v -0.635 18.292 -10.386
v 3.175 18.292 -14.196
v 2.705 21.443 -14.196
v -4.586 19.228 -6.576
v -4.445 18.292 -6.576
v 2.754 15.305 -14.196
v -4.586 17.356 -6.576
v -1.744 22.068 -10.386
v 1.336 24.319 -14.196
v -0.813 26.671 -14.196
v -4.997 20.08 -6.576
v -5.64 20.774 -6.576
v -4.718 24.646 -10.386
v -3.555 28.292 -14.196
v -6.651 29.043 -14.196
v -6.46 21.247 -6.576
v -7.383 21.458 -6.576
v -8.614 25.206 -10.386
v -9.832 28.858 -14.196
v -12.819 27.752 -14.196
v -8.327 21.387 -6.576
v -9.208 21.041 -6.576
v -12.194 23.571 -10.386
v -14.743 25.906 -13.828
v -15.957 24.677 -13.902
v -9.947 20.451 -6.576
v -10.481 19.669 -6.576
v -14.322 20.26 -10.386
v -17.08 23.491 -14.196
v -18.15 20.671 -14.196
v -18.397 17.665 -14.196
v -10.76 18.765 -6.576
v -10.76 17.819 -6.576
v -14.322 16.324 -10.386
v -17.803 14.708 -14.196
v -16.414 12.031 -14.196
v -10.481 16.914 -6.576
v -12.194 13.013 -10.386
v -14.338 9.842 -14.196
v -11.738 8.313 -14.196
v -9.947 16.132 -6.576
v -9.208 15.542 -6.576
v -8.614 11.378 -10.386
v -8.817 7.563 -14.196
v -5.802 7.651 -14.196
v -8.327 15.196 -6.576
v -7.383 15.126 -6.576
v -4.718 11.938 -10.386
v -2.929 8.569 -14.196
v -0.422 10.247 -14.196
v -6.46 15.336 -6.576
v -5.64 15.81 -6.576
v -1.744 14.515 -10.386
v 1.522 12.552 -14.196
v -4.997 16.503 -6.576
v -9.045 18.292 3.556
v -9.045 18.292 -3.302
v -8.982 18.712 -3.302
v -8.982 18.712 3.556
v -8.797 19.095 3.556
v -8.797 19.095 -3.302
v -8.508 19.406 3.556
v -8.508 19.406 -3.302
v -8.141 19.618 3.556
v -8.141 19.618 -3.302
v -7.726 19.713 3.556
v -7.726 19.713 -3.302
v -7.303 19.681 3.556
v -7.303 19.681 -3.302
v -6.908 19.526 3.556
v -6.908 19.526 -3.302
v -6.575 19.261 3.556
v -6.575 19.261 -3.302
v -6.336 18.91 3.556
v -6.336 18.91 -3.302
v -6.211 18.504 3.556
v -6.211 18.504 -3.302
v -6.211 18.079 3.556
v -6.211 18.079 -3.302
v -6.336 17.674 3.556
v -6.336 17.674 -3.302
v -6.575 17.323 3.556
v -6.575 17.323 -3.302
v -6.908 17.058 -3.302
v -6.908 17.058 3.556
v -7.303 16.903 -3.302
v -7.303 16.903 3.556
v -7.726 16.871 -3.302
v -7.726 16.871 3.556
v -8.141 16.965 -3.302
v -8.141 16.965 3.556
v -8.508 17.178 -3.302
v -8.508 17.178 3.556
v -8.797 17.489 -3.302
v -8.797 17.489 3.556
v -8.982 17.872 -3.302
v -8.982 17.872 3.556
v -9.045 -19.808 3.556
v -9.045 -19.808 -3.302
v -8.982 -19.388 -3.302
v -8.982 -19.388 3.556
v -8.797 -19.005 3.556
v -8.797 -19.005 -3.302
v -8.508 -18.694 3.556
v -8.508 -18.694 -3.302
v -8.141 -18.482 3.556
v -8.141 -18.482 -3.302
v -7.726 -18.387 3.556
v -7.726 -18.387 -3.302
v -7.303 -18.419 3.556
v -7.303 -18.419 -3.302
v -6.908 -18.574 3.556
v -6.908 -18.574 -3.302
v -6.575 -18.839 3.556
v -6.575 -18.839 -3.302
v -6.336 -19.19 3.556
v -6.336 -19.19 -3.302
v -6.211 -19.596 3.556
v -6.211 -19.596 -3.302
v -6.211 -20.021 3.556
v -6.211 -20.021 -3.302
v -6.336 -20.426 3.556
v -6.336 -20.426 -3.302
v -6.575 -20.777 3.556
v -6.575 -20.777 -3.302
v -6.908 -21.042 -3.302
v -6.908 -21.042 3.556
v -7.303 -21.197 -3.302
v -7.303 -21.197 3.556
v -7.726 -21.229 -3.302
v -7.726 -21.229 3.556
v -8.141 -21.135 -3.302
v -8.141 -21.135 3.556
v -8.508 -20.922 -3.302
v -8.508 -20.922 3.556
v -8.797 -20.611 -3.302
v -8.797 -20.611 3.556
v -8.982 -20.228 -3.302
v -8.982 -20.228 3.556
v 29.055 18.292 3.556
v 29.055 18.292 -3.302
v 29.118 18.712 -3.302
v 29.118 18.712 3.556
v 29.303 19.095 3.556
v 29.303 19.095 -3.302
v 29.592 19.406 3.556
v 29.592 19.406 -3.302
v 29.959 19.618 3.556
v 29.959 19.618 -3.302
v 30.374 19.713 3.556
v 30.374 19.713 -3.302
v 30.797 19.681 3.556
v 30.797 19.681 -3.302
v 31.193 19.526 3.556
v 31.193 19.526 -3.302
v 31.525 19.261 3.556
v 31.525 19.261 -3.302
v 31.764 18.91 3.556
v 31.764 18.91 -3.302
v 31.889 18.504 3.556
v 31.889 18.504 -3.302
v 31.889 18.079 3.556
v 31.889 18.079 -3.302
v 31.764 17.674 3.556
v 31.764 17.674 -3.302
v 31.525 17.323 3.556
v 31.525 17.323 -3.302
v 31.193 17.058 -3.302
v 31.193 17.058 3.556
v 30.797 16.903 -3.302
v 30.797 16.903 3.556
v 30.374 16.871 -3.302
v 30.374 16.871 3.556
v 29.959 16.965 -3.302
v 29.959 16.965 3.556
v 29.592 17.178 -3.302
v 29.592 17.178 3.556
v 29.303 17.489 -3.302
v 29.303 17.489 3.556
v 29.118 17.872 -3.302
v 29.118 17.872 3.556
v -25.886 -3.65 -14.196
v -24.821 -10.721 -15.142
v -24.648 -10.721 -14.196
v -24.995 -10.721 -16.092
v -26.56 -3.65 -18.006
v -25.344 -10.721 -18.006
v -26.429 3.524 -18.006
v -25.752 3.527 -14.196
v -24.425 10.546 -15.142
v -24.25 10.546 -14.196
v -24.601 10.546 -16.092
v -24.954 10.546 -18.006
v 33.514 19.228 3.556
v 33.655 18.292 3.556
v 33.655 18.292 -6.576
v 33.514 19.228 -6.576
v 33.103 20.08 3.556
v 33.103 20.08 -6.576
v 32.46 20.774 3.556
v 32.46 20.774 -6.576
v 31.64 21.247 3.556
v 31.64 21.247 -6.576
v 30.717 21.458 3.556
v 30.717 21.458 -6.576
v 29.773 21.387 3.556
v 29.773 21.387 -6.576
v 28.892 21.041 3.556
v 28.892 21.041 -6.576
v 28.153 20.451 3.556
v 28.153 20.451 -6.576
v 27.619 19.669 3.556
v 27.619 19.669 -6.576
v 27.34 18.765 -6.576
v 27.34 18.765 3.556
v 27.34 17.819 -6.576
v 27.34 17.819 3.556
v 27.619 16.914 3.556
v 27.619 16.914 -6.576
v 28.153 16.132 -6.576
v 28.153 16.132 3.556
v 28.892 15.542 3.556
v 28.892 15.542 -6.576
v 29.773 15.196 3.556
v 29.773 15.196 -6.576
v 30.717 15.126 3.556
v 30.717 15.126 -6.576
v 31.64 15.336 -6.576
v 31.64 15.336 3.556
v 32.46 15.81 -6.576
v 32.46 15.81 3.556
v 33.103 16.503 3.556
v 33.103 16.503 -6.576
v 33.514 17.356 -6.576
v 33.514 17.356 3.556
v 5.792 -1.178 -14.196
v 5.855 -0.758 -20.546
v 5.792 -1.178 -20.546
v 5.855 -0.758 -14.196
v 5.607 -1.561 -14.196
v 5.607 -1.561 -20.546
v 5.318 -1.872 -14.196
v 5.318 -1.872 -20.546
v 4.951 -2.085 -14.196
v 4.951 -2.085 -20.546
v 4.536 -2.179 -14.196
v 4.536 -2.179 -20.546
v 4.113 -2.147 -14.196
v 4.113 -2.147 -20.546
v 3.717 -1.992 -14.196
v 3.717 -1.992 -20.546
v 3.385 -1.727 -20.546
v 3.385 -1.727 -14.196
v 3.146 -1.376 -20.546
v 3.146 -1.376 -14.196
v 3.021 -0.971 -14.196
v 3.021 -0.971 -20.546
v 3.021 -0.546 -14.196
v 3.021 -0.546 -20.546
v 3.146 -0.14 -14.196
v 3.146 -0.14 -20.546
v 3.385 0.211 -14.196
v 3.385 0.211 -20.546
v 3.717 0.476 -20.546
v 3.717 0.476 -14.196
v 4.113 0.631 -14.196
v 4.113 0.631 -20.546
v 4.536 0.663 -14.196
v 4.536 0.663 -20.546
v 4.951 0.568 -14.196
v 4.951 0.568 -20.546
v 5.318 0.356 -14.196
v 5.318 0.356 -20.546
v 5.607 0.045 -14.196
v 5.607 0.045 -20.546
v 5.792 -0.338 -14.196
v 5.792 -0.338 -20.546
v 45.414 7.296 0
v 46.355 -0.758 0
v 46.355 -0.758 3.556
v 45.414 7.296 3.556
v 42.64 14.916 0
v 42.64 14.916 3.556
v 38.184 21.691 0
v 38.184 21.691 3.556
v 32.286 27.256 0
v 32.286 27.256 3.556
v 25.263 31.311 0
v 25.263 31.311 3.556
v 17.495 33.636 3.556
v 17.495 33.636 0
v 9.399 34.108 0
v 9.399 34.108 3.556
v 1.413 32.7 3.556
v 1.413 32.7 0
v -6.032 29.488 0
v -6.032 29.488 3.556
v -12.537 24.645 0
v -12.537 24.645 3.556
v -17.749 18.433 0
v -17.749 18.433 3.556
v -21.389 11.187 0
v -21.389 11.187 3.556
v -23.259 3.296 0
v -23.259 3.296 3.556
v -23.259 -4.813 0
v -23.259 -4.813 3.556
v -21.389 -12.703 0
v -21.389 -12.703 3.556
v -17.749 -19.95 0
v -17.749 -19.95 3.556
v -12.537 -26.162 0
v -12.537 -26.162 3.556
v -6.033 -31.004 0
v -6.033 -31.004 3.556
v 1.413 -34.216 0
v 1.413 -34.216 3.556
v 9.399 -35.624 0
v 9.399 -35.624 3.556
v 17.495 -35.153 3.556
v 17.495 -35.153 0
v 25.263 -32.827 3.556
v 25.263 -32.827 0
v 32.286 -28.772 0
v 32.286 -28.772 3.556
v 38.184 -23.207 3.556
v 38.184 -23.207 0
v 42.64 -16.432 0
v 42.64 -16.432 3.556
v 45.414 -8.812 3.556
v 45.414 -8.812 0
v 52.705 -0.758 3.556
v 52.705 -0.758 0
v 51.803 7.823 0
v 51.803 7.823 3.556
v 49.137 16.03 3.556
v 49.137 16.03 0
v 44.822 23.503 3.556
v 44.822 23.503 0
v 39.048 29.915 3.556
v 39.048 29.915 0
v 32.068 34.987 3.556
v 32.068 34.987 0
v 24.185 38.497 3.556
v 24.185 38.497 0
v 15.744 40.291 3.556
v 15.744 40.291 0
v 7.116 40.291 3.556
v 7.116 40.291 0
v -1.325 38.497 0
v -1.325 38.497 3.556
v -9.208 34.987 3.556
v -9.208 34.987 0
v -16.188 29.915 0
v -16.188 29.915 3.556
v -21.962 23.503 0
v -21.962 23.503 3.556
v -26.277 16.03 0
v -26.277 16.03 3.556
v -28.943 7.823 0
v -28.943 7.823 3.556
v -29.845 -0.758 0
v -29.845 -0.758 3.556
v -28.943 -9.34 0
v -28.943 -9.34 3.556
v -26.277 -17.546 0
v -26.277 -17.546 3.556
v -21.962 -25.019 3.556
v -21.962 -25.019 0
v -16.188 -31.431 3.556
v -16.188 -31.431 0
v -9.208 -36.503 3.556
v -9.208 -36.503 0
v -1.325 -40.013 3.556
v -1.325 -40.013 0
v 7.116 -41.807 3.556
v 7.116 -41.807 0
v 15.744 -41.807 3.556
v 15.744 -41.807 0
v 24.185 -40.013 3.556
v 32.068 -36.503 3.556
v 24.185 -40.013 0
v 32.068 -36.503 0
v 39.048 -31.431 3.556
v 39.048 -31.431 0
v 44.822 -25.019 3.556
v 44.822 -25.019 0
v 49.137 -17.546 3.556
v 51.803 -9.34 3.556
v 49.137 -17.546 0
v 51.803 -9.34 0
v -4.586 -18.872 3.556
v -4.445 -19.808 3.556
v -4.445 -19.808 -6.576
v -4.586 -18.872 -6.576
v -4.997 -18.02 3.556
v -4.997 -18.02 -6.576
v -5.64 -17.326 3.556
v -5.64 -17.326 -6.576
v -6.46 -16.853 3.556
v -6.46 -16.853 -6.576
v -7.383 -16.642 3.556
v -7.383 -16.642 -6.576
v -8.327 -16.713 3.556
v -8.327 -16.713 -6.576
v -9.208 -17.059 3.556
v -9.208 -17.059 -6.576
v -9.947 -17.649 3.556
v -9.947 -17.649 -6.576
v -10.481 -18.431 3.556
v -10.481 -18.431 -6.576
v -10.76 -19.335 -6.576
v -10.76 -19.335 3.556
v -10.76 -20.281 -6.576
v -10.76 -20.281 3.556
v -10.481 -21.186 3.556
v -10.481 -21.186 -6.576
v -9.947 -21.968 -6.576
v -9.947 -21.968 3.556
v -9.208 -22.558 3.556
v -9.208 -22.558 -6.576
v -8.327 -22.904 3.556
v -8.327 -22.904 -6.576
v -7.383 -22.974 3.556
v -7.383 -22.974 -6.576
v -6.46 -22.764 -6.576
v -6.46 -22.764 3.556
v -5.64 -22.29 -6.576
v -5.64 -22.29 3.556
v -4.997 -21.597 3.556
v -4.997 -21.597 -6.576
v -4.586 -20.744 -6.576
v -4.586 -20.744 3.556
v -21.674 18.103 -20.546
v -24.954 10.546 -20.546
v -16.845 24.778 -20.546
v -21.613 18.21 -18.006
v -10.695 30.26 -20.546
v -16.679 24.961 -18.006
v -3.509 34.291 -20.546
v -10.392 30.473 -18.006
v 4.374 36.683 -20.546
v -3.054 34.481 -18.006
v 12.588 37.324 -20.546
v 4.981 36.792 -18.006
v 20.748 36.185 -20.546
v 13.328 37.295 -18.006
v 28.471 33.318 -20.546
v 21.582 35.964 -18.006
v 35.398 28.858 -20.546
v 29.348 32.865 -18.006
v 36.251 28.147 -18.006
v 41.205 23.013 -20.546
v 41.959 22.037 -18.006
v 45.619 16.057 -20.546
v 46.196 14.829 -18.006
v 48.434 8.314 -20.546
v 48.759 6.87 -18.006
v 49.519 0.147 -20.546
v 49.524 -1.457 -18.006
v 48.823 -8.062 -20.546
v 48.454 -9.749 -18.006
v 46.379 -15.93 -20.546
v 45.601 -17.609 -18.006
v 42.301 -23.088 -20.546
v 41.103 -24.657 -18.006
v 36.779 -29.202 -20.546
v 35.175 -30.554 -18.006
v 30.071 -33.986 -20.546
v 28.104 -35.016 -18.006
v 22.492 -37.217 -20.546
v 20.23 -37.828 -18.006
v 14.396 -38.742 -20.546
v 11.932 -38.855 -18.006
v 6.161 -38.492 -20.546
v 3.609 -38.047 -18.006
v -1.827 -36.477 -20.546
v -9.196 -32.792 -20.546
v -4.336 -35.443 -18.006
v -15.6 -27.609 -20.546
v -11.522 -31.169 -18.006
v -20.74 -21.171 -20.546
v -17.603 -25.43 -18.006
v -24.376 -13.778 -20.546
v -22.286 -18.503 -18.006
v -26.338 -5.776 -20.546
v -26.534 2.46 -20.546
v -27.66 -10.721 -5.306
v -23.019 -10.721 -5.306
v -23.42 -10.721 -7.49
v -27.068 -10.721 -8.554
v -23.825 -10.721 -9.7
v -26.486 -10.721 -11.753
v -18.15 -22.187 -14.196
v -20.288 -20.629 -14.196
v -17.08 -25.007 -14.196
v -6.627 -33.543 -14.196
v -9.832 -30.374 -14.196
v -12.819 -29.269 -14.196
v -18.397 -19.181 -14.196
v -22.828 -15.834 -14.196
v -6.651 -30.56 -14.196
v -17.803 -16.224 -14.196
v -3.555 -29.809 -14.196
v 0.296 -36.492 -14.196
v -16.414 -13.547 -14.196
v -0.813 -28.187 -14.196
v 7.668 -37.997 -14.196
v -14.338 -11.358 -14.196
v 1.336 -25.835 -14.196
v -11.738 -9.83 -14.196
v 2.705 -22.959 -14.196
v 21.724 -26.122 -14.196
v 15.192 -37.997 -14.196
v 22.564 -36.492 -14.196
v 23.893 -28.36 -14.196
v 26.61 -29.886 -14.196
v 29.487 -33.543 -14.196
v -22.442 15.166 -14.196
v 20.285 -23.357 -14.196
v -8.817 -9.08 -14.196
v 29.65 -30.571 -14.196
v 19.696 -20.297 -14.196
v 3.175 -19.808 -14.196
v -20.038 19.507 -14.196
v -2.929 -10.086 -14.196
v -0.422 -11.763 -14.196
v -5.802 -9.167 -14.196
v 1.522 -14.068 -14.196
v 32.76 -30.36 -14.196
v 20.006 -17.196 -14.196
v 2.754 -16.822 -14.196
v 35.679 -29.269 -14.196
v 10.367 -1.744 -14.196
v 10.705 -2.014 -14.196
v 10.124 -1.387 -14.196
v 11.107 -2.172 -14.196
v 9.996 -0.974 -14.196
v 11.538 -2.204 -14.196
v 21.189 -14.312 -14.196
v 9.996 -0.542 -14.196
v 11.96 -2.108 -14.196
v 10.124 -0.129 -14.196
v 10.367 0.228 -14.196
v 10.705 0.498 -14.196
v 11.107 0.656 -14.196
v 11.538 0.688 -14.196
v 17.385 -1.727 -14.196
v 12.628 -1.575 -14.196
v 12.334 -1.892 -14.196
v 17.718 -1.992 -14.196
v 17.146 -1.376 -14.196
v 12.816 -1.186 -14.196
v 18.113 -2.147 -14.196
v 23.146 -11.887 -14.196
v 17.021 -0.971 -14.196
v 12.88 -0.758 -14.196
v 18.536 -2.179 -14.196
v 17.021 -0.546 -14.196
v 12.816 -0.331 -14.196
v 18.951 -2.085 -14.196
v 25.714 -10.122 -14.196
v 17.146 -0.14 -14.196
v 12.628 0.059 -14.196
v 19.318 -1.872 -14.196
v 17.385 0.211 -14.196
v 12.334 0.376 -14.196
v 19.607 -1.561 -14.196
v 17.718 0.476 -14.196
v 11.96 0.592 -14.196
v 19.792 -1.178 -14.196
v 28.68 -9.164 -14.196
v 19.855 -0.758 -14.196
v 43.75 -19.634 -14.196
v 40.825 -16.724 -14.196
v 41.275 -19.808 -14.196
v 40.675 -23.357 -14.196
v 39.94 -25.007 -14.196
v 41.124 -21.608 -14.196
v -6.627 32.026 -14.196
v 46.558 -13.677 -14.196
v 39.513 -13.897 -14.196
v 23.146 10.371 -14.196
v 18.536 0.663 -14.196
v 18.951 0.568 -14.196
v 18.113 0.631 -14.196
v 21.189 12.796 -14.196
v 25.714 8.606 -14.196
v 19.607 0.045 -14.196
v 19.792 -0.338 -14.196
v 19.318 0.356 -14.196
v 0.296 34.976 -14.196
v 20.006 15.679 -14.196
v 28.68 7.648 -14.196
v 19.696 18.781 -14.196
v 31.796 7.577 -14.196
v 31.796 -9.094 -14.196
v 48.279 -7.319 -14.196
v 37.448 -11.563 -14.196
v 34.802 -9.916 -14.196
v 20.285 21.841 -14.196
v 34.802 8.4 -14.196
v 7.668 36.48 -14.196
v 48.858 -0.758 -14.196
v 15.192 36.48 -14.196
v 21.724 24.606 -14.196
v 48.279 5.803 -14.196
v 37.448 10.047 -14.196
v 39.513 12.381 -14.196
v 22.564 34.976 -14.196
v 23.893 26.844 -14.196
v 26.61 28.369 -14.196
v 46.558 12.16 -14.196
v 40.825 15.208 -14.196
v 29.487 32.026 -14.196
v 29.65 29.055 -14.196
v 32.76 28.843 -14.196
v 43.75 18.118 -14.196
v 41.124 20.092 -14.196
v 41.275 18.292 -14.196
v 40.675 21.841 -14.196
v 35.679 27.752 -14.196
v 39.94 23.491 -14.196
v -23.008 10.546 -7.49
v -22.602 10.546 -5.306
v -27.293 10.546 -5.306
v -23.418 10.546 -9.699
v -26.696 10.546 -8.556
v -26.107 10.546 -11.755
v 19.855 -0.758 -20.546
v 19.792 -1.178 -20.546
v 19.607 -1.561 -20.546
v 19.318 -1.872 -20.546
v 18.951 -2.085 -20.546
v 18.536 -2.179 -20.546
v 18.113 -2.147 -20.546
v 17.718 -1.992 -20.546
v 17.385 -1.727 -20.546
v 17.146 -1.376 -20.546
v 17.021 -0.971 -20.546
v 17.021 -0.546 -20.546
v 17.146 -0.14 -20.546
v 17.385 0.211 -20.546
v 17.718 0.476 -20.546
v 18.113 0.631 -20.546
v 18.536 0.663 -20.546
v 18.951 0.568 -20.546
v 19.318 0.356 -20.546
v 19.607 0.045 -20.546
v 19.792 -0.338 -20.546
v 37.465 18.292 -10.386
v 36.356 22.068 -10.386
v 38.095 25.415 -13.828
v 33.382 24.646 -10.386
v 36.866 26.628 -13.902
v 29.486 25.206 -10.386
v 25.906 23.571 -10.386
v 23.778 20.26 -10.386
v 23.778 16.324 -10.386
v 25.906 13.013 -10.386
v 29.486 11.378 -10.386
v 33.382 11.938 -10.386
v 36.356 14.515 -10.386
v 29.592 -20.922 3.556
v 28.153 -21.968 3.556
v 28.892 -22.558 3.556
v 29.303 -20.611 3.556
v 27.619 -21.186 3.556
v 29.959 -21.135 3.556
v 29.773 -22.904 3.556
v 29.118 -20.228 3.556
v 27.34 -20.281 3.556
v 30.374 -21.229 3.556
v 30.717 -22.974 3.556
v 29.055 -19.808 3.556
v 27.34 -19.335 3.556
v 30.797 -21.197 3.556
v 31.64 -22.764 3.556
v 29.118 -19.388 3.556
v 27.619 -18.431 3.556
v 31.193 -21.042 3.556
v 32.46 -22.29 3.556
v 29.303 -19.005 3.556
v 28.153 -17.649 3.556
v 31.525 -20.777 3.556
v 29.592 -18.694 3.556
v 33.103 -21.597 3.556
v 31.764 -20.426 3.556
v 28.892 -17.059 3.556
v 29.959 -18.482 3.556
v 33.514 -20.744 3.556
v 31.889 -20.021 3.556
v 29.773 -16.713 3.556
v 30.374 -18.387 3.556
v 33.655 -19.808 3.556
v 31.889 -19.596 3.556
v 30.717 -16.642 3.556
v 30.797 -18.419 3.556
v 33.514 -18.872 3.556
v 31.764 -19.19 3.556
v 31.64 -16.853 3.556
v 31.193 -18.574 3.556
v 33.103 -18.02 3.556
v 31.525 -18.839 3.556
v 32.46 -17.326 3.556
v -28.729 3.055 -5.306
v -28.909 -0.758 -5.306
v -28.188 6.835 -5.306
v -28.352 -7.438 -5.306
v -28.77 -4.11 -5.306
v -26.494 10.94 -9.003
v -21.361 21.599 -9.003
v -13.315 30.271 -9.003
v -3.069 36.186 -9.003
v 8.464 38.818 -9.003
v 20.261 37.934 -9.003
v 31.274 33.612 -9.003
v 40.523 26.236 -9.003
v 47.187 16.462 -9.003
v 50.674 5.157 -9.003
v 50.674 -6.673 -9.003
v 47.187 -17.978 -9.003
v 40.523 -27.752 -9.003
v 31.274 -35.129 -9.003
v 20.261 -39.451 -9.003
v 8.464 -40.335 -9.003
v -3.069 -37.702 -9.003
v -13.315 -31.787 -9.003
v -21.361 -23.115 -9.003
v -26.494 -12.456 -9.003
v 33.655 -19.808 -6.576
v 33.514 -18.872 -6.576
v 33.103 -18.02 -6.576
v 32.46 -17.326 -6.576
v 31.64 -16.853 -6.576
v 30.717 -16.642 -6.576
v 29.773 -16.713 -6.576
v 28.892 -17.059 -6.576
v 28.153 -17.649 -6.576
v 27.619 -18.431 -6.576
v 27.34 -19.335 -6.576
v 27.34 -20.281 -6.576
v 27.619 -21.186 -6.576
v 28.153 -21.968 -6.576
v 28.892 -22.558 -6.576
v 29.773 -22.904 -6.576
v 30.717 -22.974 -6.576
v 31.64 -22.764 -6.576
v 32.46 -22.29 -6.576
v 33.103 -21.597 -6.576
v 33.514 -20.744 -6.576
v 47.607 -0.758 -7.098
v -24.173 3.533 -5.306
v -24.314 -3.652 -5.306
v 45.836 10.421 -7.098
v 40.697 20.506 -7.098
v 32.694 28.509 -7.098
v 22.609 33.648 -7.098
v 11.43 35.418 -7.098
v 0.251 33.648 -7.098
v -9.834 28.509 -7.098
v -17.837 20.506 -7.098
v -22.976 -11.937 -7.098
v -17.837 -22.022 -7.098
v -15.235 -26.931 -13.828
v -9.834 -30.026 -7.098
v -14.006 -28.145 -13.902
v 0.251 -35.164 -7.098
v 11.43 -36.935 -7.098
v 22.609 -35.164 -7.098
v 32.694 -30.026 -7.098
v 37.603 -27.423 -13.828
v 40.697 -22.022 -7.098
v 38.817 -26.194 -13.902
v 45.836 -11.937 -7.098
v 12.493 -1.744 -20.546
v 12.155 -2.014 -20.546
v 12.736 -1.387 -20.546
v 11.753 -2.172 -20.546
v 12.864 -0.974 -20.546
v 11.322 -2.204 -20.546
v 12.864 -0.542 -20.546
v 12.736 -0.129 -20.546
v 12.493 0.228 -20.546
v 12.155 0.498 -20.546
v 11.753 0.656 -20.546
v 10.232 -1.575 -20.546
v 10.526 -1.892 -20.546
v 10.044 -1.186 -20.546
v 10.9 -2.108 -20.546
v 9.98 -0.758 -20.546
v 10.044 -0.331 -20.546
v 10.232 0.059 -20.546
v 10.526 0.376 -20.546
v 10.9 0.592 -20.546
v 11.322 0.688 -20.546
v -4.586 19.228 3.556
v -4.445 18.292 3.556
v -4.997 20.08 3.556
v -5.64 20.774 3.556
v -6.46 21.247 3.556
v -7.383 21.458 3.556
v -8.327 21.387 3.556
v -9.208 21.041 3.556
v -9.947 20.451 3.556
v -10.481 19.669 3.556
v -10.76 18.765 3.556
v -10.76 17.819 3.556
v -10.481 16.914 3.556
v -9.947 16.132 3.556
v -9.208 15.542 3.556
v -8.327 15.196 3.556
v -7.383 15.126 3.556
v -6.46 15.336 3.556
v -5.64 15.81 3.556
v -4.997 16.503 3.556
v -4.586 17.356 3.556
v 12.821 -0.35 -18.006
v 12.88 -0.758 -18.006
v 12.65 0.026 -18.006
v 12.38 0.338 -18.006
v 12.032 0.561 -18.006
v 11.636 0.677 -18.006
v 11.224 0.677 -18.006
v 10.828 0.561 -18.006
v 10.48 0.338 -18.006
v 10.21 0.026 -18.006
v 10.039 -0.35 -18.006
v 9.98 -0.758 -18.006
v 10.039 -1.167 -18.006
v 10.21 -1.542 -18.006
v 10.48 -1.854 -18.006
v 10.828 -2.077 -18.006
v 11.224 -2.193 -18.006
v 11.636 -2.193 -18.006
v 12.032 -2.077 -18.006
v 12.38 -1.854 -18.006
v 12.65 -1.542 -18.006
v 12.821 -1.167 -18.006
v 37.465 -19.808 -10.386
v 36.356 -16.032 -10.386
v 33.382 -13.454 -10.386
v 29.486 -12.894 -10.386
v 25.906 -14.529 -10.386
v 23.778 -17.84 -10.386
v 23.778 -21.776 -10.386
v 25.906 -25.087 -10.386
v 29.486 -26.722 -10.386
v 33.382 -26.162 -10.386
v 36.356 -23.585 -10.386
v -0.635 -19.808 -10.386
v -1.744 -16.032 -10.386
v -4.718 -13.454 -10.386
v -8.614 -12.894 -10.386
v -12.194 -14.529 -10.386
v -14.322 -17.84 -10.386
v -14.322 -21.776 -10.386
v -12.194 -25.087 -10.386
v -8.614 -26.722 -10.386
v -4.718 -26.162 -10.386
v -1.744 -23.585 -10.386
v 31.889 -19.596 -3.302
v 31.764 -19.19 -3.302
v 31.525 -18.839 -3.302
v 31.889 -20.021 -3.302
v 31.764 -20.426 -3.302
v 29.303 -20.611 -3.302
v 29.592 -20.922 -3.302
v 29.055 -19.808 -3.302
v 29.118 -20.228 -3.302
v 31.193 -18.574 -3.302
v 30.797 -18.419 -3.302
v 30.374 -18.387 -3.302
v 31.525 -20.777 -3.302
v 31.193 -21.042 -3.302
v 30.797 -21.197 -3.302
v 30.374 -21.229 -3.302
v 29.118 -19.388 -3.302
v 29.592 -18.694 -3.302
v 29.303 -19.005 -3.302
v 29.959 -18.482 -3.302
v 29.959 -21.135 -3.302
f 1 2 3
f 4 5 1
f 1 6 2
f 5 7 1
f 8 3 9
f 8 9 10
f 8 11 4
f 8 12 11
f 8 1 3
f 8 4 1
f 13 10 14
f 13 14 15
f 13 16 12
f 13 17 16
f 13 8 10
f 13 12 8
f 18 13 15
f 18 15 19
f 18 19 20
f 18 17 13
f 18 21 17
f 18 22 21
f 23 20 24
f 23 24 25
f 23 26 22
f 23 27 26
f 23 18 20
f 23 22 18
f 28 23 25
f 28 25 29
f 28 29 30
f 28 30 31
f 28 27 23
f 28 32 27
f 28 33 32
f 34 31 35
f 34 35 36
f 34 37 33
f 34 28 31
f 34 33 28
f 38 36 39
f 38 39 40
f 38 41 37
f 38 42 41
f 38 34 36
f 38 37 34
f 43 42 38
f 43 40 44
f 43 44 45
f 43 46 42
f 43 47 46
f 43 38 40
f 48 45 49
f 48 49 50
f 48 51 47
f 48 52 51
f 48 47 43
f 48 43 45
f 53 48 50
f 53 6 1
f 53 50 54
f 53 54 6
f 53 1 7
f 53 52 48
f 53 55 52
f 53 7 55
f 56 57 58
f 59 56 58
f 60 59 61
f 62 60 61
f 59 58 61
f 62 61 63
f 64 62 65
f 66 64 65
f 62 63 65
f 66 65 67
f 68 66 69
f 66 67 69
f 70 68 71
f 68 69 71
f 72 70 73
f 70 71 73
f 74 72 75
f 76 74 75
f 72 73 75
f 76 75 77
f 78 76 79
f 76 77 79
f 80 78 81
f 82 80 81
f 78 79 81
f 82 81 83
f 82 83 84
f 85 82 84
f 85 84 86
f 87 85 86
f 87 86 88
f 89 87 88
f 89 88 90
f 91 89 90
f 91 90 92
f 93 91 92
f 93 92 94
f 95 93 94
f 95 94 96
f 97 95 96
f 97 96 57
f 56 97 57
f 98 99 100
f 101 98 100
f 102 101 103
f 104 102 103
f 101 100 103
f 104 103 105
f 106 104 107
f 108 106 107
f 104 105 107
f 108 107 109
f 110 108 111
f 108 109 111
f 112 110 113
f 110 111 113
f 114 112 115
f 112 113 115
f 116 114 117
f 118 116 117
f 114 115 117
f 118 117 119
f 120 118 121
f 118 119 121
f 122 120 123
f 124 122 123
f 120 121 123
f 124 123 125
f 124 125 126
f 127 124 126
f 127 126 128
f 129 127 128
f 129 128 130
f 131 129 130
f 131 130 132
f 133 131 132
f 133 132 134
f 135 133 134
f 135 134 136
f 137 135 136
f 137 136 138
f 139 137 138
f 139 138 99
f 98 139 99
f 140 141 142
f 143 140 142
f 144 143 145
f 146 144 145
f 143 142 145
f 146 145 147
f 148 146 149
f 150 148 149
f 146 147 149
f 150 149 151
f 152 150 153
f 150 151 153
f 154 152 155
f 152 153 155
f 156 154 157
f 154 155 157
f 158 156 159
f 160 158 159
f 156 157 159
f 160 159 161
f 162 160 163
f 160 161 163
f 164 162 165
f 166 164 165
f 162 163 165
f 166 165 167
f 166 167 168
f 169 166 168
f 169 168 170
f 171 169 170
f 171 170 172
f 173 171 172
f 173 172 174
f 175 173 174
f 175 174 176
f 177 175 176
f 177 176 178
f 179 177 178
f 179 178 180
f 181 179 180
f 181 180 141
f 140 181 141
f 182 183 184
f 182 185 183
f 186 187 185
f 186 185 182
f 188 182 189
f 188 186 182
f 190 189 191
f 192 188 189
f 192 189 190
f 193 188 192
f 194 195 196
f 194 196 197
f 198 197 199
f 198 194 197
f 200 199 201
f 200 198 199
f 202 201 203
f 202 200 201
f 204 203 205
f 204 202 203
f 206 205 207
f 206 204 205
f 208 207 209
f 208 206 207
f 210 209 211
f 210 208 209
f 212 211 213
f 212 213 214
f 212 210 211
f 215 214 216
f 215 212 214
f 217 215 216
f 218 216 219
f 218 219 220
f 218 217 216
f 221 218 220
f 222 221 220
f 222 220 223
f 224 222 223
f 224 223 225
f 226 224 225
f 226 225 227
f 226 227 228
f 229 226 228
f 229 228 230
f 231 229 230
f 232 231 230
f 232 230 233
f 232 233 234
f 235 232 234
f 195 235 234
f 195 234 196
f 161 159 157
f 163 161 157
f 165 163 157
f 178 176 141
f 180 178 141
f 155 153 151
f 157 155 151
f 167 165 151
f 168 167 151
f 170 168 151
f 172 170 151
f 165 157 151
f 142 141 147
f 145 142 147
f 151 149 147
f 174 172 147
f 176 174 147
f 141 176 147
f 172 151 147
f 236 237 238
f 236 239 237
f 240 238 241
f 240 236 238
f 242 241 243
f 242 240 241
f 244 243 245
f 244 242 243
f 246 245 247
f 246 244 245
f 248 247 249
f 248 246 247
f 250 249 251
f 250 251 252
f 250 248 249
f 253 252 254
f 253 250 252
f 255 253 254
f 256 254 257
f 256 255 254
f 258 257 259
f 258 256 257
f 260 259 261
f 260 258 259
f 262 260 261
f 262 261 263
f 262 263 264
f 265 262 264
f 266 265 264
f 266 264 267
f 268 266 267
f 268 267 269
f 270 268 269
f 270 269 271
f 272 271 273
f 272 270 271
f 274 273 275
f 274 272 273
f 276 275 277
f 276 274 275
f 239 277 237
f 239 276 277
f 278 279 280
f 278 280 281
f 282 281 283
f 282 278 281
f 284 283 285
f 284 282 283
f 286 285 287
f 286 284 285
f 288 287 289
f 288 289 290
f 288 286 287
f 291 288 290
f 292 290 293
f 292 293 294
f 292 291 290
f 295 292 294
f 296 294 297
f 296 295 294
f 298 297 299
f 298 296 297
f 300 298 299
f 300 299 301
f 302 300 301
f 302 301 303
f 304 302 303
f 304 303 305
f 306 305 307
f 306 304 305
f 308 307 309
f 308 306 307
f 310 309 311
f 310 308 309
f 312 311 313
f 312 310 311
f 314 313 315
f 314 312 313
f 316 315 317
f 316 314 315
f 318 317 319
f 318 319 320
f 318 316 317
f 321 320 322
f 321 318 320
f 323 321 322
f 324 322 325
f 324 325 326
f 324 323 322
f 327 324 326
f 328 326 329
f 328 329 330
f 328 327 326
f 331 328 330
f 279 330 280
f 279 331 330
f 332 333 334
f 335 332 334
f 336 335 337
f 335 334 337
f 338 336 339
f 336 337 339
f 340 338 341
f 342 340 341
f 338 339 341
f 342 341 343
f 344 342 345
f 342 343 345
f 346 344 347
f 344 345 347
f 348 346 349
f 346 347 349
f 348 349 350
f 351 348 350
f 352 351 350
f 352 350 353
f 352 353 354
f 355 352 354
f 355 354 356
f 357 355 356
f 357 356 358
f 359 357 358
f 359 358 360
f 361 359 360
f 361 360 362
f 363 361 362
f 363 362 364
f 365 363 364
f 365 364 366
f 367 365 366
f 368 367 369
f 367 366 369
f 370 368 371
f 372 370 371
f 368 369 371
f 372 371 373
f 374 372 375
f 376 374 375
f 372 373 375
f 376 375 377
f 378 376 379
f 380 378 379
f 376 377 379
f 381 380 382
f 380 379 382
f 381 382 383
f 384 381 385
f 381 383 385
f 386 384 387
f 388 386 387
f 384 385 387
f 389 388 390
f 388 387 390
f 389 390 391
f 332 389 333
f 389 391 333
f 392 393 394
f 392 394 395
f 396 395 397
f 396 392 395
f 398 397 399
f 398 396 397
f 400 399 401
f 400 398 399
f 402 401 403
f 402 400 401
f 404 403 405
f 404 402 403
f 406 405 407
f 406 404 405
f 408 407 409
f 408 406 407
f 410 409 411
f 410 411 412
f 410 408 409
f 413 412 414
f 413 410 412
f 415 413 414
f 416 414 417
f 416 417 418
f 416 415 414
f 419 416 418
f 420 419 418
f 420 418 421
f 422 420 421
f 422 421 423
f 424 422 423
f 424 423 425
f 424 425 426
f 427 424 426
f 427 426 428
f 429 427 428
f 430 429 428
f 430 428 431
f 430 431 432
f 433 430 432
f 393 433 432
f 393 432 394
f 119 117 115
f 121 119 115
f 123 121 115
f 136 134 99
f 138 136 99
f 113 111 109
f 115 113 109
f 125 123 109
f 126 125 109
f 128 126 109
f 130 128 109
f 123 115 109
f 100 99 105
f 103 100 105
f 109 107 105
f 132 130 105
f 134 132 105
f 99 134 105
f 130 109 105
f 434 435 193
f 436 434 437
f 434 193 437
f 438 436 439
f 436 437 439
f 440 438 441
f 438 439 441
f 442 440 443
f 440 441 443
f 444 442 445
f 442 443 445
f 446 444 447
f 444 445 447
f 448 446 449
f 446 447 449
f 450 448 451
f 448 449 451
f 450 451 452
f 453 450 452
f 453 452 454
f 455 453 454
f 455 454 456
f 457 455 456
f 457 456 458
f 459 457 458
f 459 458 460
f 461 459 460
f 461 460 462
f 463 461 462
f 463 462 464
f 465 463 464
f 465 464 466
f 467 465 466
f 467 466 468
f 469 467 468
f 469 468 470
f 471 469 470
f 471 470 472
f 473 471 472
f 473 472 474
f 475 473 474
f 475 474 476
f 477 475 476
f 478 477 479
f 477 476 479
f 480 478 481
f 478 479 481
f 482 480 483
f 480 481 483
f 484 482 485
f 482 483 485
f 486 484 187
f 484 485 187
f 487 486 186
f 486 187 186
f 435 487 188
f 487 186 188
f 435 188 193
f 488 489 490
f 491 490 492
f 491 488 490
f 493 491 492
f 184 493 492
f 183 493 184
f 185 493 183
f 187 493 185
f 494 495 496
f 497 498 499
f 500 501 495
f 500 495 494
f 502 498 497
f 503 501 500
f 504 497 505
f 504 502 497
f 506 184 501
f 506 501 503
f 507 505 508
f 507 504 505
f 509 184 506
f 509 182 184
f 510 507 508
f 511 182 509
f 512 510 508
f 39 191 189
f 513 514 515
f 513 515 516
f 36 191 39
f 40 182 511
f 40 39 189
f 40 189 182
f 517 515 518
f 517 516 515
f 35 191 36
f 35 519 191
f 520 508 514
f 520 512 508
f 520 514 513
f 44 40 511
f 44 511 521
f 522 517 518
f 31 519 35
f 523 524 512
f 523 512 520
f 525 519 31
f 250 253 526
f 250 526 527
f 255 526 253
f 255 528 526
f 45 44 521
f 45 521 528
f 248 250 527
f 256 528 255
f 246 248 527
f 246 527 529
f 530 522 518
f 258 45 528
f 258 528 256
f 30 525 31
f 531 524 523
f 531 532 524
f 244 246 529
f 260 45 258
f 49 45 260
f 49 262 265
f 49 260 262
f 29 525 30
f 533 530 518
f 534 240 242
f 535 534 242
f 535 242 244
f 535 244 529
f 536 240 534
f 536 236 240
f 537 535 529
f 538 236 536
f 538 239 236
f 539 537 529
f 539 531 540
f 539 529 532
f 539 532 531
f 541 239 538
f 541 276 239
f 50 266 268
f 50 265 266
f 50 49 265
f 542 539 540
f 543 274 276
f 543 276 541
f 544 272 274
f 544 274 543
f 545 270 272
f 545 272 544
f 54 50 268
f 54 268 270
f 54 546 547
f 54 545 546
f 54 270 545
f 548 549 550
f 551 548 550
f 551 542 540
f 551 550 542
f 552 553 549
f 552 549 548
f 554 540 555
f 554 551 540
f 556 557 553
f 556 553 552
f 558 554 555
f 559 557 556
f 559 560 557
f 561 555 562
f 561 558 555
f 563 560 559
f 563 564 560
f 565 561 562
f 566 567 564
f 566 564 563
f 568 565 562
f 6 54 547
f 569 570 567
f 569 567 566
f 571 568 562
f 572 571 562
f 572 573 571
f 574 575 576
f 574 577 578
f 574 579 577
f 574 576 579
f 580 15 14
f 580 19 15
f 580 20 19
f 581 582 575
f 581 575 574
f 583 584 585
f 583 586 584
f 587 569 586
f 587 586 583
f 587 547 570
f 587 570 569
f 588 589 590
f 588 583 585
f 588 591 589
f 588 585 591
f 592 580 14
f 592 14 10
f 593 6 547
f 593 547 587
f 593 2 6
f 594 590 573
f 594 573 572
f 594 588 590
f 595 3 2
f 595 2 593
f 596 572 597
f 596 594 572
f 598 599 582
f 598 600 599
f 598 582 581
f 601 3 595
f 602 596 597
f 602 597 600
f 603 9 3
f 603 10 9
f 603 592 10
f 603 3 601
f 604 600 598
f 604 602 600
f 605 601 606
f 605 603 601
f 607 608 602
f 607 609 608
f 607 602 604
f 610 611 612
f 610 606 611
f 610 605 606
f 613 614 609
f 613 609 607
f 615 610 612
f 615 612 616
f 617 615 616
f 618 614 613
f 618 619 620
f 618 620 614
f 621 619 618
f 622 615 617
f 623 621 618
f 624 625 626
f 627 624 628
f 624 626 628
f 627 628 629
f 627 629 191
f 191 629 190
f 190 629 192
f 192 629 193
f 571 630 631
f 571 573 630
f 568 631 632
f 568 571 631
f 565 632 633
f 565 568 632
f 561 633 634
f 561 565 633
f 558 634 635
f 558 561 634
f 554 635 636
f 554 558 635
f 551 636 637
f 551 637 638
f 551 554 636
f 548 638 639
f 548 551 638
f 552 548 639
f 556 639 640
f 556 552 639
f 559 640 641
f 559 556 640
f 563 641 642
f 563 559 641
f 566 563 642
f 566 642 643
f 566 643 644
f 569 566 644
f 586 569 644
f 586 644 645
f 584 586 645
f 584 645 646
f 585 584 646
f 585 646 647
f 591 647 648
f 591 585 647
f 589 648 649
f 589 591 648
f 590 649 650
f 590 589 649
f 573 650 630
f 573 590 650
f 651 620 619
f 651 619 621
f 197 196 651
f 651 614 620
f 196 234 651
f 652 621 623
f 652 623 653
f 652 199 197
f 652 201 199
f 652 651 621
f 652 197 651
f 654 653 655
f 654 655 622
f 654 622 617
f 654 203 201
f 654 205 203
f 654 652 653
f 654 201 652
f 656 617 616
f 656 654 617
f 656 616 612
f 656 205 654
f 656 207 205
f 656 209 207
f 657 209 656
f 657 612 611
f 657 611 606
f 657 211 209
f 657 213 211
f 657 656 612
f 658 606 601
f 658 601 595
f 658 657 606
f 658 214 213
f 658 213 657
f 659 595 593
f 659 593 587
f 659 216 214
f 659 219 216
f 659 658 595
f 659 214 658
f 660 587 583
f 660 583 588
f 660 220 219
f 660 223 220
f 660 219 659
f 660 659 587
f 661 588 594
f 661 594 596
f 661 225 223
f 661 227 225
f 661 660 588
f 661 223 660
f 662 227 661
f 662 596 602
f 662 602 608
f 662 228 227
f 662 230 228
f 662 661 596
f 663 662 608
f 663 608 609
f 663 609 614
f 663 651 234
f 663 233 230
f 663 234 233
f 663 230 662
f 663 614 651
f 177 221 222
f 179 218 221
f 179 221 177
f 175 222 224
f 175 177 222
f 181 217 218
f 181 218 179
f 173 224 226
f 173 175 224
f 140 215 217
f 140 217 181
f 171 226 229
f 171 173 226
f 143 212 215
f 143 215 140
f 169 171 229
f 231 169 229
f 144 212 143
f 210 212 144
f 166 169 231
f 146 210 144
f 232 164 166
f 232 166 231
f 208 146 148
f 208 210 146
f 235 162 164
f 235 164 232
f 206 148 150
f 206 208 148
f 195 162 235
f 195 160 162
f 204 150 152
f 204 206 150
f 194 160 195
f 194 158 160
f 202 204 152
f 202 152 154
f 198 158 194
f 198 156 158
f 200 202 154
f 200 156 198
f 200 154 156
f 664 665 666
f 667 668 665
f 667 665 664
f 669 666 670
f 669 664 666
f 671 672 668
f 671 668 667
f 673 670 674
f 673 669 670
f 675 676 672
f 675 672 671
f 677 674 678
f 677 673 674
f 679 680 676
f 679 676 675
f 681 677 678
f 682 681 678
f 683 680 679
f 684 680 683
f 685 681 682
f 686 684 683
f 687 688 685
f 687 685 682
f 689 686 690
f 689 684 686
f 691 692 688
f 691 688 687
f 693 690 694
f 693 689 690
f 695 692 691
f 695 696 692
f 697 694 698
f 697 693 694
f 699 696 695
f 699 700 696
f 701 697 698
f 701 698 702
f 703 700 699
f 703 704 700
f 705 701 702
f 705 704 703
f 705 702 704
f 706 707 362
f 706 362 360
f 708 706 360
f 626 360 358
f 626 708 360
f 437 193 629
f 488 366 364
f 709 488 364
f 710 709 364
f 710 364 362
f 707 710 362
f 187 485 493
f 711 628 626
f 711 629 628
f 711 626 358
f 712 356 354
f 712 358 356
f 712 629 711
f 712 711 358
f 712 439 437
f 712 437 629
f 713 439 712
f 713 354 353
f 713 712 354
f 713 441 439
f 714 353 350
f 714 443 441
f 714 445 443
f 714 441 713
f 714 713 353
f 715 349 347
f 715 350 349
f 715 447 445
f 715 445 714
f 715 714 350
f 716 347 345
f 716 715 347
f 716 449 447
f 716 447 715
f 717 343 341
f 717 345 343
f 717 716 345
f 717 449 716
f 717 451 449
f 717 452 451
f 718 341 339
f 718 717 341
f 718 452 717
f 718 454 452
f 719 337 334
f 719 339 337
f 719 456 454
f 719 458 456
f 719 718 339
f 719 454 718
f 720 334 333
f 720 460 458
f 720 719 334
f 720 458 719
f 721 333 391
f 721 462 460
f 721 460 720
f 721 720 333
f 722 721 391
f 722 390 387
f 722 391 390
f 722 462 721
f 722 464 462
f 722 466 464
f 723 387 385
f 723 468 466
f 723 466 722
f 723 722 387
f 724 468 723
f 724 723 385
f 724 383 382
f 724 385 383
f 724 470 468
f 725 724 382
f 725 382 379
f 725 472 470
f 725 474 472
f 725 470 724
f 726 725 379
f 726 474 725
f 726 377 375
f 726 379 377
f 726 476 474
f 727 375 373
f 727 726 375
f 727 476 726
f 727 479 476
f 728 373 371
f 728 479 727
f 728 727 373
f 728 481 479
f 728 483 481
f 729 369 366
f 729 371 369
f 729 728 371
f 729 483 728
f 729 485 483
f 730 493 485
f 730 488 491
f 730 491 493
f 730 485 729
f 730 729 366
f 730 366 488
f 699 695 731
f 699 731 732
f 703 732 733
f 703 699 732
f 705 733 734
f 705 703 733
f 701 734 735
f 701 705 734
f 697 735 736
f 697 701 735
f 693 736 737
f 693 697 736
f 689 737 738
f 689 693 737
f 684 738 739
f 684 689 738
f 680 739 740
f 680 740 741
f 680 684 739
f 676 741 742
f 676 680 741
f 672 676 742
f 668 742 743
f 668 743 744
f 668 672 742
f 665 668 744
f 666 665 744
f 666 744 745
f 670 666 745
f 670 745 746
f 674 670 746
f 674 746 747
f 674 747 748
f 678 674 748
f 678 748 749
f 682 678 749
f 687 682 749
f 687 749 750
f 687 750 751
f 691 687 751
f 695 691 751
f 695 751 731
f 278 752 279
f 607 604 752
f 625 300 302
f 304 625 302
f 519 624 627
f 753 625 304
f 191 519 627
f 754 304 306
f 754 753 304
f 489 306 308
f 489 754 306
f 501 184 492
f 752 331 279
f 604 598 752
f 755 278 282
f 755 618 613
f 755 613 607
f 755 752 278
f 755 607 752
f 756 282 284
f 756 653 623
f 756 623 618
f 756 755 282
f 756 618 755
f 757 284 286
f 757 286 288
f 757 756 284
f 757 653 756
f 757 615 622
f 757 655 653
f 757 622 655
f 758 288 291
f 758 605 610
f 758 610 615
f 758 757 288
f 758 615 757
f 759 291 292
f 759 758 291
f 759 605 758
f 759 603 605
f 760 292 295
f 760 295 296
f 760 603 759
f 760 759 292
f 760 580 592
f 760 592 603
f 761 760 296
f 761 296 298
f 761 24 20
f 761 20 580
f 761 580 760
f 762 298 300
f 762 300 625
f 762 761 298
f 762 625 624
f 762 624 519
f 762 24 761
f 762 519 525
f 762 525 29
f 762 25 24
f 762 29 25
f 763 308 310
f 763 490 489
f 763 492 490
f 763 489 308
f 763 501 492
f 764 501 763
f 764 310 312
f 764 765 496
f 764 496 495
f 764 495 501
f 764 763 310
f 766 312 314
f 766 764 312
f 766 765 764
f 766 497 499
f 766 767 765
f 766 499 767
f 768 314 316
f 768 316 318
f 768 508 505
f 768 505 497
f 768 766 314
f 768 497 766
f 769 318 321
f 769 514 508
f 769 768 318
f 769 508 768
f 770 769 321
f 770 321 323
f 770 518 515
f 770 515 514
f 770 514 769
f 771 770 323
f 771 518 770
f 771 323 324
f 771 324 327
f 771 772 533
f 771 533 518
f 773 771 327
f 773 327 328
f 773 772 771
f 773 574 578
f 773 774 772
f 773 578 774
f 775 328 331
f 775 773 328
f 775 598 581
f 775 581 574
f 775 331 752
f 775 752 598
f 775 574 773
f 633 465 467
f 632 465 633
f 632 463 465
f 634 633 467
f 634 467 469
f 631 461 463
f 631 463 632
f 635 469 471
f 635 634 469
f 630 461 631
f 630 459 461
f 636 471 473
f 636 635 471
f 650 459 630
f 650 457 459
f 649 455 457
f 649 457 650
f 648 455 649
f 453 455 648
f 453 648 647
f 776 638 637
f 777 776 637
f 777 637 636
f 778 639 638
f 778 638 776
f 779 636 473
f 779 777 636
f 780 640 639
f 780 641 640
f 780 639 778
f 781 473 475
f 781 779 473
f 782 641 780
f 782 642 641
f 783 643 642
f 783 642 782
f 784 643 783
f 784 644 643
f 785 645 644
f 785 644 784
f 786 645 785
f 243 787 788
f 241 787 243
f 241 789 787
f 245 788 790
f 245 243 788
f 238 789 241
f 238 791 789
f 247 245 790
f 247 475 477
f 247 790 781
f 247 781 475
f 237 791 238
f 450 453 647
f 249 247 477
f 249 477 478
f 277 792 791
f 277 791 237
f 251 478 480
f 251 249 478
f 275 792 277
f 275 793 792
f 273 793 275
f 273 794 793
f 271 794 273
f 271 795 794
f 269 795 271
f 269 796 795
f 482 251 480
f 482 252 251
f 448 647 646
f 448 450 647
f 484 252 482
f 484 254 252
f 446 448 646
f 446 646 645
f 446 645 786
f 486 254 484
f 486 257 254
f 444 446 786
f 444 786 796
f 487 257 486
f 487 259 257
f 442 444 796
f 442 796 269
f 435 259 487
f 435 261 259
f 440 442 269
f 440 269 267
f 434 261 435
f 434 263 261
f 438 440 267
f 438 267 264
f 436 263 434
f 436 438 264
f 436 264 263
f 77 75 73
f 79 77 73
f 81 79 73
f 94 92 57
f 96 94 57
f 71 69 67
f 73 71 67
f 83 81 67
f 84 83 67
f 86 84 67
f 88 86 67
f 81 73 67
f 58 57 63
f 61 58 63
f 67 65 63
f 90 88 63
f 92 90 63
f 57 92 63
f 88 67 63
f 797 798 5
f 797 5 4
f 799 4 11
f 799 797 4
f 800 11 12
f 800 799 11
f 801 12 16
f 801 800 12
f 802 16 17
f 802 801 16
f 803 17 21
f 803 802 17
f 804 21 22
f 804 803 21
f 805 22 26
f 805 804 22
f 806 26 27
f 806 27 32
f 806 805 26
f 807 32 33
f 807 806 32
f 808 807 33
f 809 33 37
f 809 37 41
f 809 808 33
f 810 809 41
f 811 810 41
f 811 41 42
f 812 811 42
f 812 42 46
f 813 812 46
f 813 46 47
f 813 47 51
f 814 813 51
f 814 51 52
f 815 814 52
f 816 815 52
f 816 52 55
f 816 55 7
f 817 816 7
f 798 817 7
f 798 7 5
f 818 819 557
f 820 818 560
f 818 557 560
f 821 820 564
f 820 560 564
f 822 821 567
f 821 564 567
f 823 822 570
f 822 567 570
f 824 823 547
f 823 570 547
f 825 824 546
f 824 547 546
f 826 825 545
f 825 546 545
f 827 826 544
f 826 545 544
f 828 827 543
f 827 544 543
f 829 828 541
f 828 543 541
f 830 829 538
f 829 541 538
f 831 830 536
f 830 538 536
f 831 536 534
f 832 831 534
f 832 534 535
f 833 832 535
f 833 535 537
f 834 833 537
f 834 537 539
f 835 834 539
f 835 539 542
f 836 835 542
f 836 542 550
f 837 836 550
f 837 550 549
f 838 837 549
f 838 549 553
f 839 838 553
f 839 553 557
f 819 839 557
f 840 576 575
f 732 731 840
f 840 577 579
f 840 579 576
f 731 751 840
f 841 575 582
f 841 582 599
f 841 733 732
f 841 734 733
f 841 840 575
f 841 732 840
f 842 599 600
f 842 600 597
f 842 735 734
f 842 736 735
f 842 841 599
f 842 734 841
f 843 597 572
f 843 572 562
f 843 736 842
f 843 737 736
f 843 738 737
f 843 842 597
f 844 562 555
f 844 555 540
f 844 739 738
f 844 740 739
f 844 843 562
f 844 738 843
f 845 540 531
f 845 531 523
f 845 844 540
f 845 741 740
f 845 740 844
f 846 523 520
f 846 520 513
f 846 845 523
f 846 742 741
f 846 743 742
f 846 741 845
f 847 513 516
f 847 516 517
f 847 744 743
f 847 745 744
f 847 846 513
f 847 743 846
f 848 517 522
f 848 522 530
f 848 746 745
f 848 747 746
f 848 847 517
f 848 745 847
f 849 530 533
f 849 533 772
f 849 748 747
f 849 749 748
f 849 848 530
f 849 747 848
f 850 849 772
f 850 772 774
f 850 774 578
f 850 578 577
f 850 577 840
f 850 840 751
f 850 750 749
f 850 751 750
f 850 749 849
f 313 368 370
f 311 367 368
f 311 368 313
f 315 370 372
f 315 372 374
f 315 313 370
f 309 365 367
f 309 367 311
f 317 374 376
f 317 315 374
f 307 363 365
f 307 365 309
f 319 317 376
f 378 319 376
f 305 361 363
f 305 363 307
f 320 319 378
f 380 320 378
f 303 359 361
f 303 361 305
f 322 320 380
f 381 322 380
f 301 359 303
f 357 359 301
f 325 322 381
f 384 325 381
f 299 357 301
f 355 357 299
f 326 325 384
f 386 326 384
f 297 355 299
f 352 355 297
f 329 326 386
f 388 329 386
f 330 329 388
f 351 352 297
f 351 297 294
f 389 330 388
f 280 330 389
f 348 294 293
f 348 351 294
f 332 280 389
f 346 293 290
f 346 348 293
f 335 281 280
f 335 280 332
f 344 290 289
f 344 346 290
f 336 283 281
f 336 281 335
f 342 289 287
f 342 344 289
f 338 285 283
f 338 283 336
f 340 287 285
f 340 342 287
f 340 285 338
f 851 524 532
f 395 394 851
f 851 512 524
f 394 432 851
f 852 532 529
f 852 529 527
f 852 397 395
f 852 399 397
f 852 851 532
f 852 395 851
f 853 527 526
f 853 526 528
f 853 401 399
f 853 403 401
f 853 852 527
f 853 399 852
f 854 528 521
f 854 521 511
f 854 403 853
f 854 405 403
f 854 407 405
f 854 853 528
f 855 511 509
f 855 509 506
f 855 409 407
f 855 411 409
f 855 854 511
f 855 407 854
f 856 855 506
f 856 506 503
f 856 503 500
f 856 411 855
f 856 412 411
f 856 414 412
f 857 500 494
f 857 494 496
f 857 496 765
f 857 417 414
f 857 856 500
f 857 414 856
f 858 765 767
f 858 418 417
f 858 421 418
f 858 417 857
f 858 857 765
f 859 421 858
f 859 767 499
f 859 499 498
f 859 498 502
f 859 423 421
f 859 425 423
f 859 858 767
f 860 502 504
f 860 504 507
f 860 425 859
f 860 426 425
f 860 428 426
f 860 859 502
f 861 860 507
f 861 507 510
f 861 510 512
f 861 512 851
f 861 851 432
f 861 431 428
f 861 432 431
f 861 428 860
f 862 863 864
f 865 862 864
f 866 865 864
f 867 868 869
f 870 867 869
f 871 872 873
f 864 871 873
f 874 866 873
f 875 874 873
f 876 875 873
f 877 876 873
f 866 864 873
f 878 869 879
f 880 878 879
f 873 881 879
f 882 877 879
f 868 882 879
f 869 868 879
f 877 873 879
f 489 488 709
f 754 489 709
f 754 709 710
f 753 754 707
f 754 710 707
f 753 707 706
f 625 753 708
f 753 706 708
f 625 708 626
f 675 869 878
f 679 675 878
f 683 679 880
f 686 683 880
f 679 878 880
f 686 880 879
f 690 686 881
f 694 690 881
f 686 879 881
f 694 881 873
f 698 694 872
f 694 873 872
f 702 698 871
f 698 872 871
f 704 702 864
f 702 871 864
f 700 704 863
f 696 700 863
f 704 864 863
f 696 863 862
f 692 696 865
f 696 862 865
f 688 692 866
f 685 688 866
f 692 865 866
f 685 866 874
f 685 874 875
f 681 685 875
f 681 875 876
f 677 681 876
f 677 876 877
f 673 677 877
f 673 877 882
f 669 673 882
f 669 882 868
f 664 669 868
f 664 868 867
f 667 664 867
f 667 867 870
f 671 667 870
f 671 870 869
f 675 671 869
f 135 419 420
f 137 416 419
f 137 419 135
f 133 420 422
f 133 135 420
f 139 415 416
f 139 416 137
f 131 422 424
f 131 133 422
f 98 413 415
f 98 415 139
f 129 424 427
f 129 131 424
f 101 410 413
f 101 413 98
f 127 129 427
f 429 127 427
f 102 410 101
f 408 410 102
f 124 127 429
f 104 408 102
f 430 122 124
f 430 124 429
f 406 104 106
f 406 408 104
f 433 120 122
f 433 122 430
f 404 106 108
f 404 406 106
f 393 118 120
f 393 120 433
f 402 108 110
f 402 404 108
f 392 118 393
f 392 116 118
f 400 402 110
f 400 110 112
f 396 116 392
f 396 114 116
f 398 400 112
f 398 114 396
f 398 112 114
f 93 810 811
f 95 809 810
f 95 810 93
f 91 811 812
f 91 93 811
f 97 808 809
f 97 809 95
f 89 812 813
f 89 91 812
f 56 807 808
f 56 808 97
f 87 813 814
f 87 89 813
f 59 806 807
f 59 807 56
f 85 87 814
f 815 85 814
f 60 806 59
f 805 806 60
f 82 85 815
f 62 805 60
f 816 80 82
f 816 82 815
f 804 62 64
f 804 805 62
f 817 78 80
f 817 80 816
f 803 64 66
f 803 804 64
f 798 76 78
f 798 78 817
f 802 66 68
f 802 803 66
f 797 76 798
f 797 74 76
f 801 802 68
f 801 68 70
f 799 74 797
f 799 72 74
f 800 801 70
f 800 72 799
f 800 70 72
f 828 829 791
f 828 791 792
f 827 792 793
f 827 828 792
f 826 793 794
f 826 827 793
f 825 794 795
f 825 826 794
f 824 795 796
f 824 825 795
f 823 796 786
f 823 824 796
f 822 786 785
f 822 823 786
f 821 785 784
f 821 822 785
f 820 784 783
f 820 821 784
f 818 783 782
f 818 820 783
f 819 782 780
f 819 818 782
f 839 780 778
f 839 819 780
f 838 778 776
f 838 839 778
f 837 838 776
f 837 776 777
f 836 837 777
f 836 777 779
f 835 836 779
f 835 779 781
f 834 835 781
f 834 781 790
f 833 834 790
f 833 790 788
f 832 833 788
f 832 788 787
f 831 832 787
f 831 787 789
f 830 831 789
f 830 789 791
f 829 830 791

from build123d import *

# Parameters (mm, degrees)
SKETCH2_R                 = 41.27500000000001
SKETCH2_R_2               = 34.925000000000004
BOSS_EXTRUDE1_DEPTH       = 3.555999999999654
SKETCH54_R                = 41.27500000000001
SKETCH54_R_2              = 34.92500000000001
BOSS_EXTRUDE2_DEPTH       = 25.4
BOSS_EXTRUDE2_TAPER       = 10.000000000000021
BOSS_EXTRUDE3_START       = -18.006319777
BOSS_EXTRUDE3_OUTLINE_R   = 38.1
BOSS_EXTRUDE3_DEPTH       = 3.81
BOSS_EXTRUDE5_REACH       = 72.778
SKETCH63_R                = 3.175000000000002
SKETCH63_R_2              = 3.175000000000009
SKETCH63_R_3              = 3.1750000000000047
SKETCH63_R_4              = 3.1750000000000056
F_3_0MM_DOWEL_HOLE4_D     = 2.85
F_3_0MM_DOWEL_HOLE4_DEPTH = 6.858
F_3_0MM_DOWEL_HOLE3_D     = 2.9
CUT_EXTRUDE2_REACH        = 126.878
SKETCH58_W                = 12.700000000000001
SKETCH58_H                = 21.266668123278706
SKETCH60_R                = 1.4249999999999978
SKETCH60_R_2              = 1.4250000000000005
CUT_EXTRUDE4_DEPTH        = 70.71188168256496
SKETCH64_R                = 1.425000000000001
SKETCH64_R_2              = 1.4249999999999978
SKETCH64_R_3              = 1.4499999999999962
BOSS_EXTRUDE6_DEPTH       = 2.54
CHAMFER1_SIZE             = 7.62


with BuildPart() as part:
    # Sketch2 → Boss-Extrude1 (new body)
    with BuildSketch(Plane(origin=(0, 0.7215916123591171, 0), x_dir=(1, 0, 0), z_dir=(0, 0, 1))):
        with Locations((11.43, -1.4797279014976155)):
            Circle(SKETCH2_R)
        with Locations((11.43, -1.4797279014976155)):
            Circle(SKETCH2_R_2, mode=Mode.SUBTRACT)
    extrude(amount=BOSS_EXTRUDE1_DEPTH)

    # Sketch54 → Boss-Extrude2 (add)
    with BuildSketch(Plane(origin=(0, 0, 0), x_dir=(-1, 0, 0), z_dir=(0, 0, -1))):
        with Locations((-11.43, -0.7581362891384984)):
            Circle(SKETCH54_R)
        with Locations(Location((-11.43, -0.7581362891384984, 0), (0, 0, 180))):
            Circle(SKETCH54_R_2, mode=Mode.SUBTRACT)
    extrude(amount=BOSS_EXTRUDE2_DEPTH, taper=BOSS_EXTRUDE2_TAPER)

    # Boss-Extrude3: read off the stored shape, not the designer's step
    # Boss-Extrude3 outline → Boss-Extrude3 (add)
    with BuildSketch(Plane.XY.offset(BOSS_EXTRUDE3_START)):
        with Locations((11.43, -0.758136289)):
            Circle(BOSS_EXTRUDE3_OUTLINE_R)
    extrude(amount=BOSS_EXTRUDE3_DEPTH)

    # Sketch63 → Boss-Extrude5 (add, up to next)
    with BuildSketch(Plane.XY.offset(3.555999999999654), mode=Mode.PRIVATE) as boss_extrude5_sk1:
        with Locations((-7.620000000000007, 18.2918637108615)):
            Circle(SKETCH63_R)
    boss_extrude5_tool1 = extrude(boss_extrude5_sk1.sketch, amount=-BOSS_EXTRUDE5_REACH, mode=Mode.PRIVATE) - part.part
    # Sketch63 → Boss-Extrude5 (add, up to next)
    with BuildSketch(Plane.XY.offset(3.555999999999654), mode=Mode.PRIVATE) as boss_extrude5_sk2:
        with Locations((30.479999999999997, 18.291863710861506)):
            Circle(SKETCH63_R_2)
    boss_extrude5_tool2 = extrude(boss_extrude5_sk2.sketch, amount=-BOSS_EXTRUDE5_REACH, mode=Mode.PRIVATE) - part.part
    # Sketch63 → Boss-Extrude5 (add, up to next)
    with BuildSketch(Plane.XY.offset(3.555999999999654), mode=Mode.PRIVATE) as boss_extrude5_sk3:
        with Locations((30.48, -19.8081362891385)):
            Circle(SKETCH63_R_3)
    boss_extrude5_tool3 = extrude(boss_extrude5_sk3.sketch, amount=-BOSS_EXTRUDE5_REACH, mode=Mode.PRIVATE) - part.part
    # Sketch63 → Boss-Extrude5 (add, up to next)
    with BuildSketch(Plane.XY.offset(3.555999999999654), mode=Mode.PRIVATE) as boss_extrude5_sk4:
        with Locations((-7.620000000000007, -19.8081362891385)):
            Circle(SKETCH63_R_4)
    boss_extrude5_tool4 = extrude(boss_extrude5_sk4.sketch, amount=-BOSS_EXTRUDE5_REACH, mode=Mode.PRIVATE) - part.part
    add(boss_extrude5_tool1.solids().sort_by_distance((-7.62, 18.291864, 3.556))[0])
    add(boss_extrude5_tool2.solids().sort_by_distance((30.48, 18.291864, 3.556))[0])
    add(boss_extrude5_tool3.solids().sort_by_distance((30.48, -19.808136, 3.556))[0])
    add(boss_extrude5_tool4.solids().sort_by_distance((-7.62, -19.808136, 3.556))[0])

    # Ø3.0mm Dowel Hole4
    with Locations(Plane.XY.offset(3.555999999999654)):
        with Locations((-7.62, 18.291863711), (30.48, 18.291863711), (30.48, -19.808136289), (-7.62, -19.808136289)):
            Hole(F_3_0MM_DOWEL_HOLE4_D / 2, depth=F_3_0MM_DOWEL_HOLE4_DEPTH)

    # Ø3.0mm Dowel Hole3 (through all)
    with Locations(Plane(origin=(0, 0, -18.006319777286198), x_dir=(-1, 0, 0), z_dir=(0, 0, -1))):
        with Locations((-11.43, -0.758136289)):
            Hole(F_3_0MM_DOWEL_HOLE3_D / 2)

    # Cut-Extrude2: up to this cone (the profile starts outside it)
    cut_extrude2_end = Plane(origin=(11.43, -0.7581362891384984, -11.65632), z_dir=(0, 0, -1)) * Cone(7.999516737370435, 65.961130686173, 328.7166474235434, mode=Mode.PRIVATE)
    # Sketch58 → Cut-Extrude2 (cut, up to the surface)
    with BuildSketch(Plane(origin=(-63.5, 0, 0), x_dir=(0, 0, -1), z_dir=(1, 0, 0)), mode=Mode.PRIVATE) as cut_extrude2_sk1:
        with Locations((11.656319777286228, -0.08753137128510957)):
            Rectangle(SKETCH58_W, SKETCH58_H)
    cut_extrude2_tool1 = extrude(cut_extrude2_sk1.sketch, amount=CUT_EXTRUDE2_REACH, mode=Mode.PRIVATE) - cut_extrude2_end
    add(cut_extrude2_tool1.solids().sort_by_distance((-63.5, -0.087531, -11.65632))[0], mode=Mode.SUBTRACT)

    # Sketch60 → Cut-Extrude4 (cut, through all)
    with BuildSketch(Plane.XY.offset(-14.196319777286197)):
        with Locations((18.43, -0.7581362891384957)):
            Circle(SKETCH60_R)
        with Locations((4.429999999999999, -0.7581362891384984)):
            Circle(SKETCH60_R_2)
    extrude(amount=-CUT_EXTRUDE4_DEPTH, mode=Mode.SUBTRACT)

    # Sketch64 → Boss-Extrude6 (add)
    with BuildSketch(Plane(origin=(0, 0, -18.006319777286198), x_dir=(-1, 0, 0), z_dir=(0, 0, -1))):
        with BuildLine():
            ThreePointArc((25.344366452837203, -10.720865432924475), (26.663599038852283, -0.05977229582778121), (24.954487952256596, 10.545802690354252))
            ThreePointArc((24.954487952256596, 10.545802690354252), (-49.52359903885228, -1.4565002824492193), (25.344366452837203, -10.720865432924475))
        make_face()
        with Locations(Location((-4.429999999999999, -0.7581362891384984, 0), (0, 0, 180))):
            Circle(SKETCH64_R, mode=Mode.SUBTRACT)
        with Locations(Location((-18.43, -0.7581362891384957, 0), (0, 0, 180))):
            Circle(SKETCH64_R_2, mode=Mode.SUBTRACT)
        with Locations((-11.43, -0.7581362891384984)):
            Circle(SKETCH64_R_3, mode=Mode.SUBTRACT)
    extrude(amount=BOSS_EXTRUDE6_DEPTH)

    # Chamfer1
    # the kernel refuses this chamfer: 7.62 mm, written as the material it adds along each edge
    with BuildSketch(Plane(origin=(-7.620000000000007, 18.2918637108615, -14.196319777000001), x_dir=(1, 0, 0), z_dir=(0, -1, 0))) as chamfer1_piece_1:
        Polygon((3.1750000000000016 + CHAMFER1_SIZE, 0), (3.1750000000000016, CHAMFER1_SIZE), (3.1750000000000016, 0), align=None)
    revolve(axis=Axis((-7.620000000000007, 18.2918637108615, -14.196319777000001), (0, 0, 1)))
    with BuildSketch(Plane(origin=(30.479999999999997, 18.291863710861506, -14.196319777000001), x_dir=(1, 0, 0), z_dir=(0, -1, 0))) as chamfer1_piece_2:
        Polygon((3.1750000000000043 + CHAMFER1_SIZE, 0), (3.1750000000000043, CHAMFER1_SIZE), (3.1750000000000043, 0), align=None)
    revolve(axis=Axis((30.479999999999997, 18.291863710861506, -14.196319777000001), (0, 0, 1)))
    with BuildSketch(Plane(origin=(30.48, -19.8081362891385, -14.196319777000001), x_dir=(1, 0, 0), z_dir=(0, -1, 0))) as chamfer1_piece_3:
        Polygon((3.1750000000000007 + CHAMFER1_SIZE, 0), (3.1750000000000007, CHAMFER1_SIZE), (3.1750000000000007, 0), align=None)
    revolve(axis=Axis((30.48, -19.8081362891385, -14.196319777000001), (0, 0, 1)))
    with BuildSketch(Plane(origin=(-7.620000000000007, -19.8081362891385, -14.196319777000001), x_dir=(1, 0, 0), z_dir=(0, -1, 0))) as chamfer1_piece_4:
        Polygon((3.175000000000005 + CHAMFER1_SIZE, 0), (3.175000000000005, CHAMFER1_SIZE), (3.175000000000005, 0), align=None)
    revolve(axis=Axis((-7.620000000000007, -19.8081362891385, -14.196319777000001), (0, 0, 1)))


solid = part.part
